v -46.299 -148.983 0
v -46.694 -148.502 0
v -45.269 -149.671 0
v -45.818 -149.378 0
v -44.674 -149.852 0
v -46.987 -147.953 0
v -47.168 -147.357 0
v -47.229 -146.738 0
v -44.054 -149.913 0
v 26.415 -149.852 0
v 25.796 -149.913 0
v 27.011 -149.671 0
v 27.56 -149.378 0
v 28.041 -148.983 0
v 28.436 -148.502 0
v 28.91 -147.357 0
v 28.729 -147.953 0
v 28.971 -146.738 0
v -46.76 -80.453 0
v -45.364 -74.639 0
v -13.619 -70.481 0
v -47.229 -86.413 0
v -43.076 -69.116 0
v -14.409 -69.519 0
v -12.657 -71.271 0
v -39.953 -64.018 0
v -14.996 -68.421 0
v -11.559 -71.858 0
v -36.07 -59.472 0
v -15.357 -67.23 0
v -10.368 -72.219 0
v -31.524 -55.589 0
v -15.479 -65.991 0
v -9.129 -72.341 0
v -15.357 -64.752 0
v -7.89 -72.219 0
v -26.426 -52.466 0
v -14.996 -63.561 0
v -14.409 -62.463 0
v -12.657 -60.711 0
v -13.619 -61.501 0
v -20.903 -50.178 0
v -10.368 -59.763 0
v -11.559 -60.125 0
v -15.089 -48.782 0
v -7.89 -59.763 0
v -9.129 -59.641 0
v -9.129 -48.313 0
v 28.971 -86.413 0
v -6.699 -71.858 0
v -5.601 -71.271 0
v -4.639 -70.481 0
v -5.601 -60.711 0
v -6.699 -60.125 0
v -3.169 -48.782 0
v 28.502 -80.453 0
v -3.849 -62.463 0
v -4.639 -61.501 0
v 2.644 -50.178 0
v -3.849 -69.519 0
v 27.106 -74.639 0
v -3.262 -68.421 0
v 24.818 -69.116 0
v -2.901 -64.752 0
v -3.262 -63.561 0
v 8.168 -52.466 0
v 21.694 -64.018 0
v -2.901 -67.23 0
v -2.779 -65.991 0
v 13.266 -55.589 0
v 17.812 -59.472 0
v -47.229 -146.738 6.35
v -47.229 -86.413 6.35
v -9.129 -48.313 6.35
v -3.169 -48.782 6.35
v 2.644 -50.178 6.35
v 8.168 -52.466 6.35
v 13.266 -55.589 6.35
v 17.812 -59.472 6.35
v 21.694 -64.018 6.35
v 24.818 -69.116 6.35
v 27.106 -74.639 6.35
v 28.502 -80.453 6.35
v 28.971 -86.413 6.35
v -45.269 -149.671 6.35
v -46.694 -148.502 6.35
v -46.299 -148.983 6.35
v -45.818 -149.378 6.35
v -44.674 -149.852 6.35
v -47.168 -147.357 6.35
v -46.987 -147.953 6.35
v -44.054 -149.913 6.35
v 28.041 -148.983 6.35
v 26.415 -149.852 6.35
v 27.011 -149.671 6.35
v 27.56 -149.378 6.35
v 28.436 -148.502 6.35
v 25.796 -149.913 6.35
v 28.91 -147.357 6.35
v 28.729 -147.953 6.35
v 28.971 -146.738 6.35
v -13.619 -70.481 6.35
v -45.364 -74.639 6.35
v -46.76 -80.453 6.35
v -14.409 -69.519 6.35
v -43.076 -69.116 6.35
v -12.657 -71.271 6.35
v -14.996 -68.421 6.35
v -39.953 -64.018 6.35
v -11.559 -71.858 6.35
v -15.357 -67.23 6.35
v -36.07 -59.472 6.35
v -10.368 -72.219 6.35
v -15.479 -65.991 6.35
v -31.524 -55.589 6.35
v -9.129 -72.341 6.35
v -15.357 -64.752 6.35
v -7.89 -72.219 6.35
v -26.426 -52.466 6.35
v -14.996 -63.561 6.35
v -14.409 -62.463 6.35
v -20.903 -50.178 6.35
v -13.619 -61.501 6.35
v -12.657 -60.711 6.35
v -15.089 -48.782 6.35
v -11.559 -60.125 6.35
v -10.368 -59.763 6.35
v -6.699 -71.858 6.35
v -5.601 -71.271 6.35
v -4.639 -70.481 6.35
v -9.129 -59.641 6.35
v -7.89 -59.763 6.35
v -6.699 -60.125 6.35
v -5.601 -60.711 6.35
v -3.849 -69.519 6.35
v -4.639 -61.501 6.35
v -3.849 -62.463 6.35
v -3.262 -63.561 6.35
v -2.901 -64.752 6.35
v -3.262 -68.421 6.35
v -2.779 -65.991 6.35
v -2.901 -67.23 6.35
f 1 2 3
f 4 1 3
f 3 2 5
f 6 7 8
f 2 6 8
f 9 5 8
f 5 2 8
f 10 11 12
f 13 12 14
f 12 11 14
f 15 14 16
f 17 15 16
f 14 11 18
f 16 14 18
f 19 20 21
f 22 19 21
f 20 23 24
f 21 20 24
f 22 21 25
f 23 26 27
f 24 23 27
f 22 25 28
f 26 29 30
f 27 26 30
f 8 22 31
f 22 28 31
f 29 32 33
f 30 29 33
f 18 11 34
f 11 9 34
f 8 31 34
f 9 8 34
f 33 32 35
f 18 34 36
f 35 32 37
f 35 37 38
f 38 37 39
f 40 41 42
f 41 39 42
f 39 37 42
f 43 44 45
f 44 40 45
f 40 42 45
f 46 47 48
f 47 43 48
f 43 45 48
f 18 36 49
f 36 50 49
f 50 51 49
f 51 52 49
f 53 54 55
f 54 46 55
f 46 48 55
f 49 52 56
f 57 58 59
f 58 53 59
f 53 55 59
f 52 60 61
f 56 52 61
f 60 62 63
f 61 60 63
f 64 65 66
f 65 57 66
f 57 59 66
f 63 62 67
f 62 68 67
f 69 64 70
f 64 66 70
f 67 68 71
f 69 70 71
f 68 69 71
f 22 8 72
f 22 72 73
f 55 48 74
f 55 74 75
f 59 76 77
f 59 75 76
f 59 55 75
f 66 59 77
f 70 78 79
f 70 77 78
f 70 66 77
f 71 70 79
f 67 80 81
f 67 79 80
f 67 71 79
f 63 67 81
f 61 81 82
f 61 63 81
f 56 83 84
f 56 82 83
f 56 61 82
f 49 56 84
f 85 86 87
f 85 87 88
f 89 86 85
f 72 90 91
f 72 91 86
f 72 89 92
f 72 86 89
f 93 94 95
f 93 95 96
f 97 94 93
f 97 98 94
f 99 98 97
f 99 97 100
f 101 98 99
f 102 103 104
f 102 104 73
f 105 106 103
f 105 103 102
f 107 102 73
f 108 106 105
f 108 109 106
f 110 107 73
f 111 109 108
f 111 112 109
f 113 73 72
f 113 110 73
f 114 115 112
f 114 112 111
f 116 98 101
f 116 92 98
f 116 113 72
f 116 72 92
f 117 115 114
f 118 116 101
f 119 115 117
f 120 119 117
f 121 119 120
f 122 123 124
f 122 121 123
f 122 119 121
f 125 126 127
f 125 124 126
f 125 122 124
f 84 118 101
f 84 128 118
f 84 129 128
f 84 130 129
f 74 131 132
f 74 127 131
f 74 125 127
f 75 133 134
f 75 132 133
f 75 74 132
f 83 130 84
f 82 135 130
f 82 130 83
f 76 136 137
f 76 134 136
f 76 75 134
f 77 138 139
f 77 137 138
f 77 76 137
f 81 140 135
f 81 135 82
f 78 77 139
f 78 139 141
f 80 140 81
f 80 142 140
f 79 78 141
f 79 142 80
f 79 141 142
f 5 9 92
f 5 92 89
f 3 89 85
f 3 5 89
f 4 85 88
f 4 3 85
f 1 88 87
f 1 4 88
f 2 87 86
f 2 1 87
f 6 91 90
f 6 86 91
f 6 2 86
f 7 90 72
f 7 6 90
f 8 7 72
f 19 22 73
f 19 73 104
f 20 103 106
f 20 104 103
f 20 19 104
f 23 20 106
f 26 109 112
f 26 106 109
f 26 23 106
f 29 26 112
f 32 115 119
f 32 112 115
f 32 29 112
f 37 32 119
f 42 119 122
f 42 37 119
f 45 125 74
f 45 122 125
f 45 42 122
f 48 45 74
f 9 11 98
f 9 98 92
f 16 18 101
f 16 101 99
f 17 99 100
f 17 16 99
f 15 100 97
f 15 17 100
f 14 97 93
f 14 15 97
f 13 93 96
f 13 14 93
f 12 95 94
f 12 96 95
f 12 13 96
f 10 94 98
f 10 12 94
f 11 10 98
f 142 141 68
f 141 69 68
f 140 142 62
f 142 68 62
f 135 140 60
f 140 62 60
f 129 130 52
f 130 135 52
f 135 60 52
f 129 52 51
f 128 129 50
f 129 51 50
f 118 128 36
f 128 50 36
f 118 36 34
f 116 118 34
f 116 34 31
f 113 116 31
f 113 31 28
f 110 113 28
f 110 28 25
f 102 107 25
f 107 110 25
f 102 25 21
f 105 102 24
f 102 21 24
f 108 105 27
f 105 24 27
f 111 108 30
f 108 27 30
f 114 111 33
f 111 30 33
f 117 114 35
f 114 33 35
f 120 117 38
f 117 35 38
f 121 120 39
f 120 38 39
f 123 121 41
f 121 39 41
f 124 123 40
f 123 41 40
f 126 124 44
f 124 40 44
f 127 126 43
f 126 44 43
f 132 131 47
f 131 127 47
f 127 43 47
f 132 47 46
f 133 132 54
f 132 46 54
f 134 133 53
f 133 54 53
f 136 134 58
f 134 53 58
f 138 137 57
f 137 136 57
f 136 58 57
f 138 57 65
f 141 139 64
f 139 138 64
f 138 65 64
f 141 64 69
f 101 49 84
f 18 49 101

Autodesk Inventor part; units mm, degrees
ref_plane "YZ Plane" through (0, 0, 0) normal (1, 0, 0) x (0, 1, 0)
ref_plane "XZ Plane" through (0, 0, 0) normal (0, 1, 0) x (-1, 0, 0)
ref_plane "XY Plane" through (0, 0, 0) normal (0, 0, 1) x (1, 0, 0)
sketch "Sketch1" plane through (0, 0, 0) normal (0, 0, 1) x (1, 0, 0)
  circle A0 centre (-9.1291, -65.9913) radius 6.35
  line L0 (3.5709, -48.3129) -> (3.5709, -48.3129)
  line L1 (28.9709, -86.4129) -> (28.9709, -146.7379)
  line L2 (25.7959, -149.9129) -> (-44.0541, -149.9129)
  line L3 (-47.2291, -146.7379) -> (-47.2291, -86.4129)
  arc A1 (25.7959, -149.9129) -> (28.9709, -146.7379) centre (25.7959, -146.7379) ccw
  arc A2 (-47.2291, -146.7379) -> (-44.0541, -149.9129) centre (-44.0541, -146.7379) ccw
  line L4 (-9.1291, -48.3129) -> (-9.1291, -48.3129)
  arc A3 (-9.1291, -48.3129) -> (-47.2291, -86.4129) centre (-9.1291, -86.4129) ccw
  arc A4 (28.9709, -86.4129) -> (-9.1291, -48.3129) centre (-9.1291, -86.4129) ccw
  point P0 (0, 0)
  point P1 (28.9709, -149.9129)
  point P2 (-47.2291, -149.9129)
  point P3 (28.9709, -73.7129)
  dimension "d0" = 12.7
  dimension "d1" = 76.2
  dimension "d3" = 83.9216
  dimension "d4" = 38.1
  dimension "d11" = 101.6
  dimension "d12" = 38.1
extrude "Extrusion1" add sketch "Sketch1" along normal blind 6.35
properties part number "2 Stage Climer in a box lower bracket"
